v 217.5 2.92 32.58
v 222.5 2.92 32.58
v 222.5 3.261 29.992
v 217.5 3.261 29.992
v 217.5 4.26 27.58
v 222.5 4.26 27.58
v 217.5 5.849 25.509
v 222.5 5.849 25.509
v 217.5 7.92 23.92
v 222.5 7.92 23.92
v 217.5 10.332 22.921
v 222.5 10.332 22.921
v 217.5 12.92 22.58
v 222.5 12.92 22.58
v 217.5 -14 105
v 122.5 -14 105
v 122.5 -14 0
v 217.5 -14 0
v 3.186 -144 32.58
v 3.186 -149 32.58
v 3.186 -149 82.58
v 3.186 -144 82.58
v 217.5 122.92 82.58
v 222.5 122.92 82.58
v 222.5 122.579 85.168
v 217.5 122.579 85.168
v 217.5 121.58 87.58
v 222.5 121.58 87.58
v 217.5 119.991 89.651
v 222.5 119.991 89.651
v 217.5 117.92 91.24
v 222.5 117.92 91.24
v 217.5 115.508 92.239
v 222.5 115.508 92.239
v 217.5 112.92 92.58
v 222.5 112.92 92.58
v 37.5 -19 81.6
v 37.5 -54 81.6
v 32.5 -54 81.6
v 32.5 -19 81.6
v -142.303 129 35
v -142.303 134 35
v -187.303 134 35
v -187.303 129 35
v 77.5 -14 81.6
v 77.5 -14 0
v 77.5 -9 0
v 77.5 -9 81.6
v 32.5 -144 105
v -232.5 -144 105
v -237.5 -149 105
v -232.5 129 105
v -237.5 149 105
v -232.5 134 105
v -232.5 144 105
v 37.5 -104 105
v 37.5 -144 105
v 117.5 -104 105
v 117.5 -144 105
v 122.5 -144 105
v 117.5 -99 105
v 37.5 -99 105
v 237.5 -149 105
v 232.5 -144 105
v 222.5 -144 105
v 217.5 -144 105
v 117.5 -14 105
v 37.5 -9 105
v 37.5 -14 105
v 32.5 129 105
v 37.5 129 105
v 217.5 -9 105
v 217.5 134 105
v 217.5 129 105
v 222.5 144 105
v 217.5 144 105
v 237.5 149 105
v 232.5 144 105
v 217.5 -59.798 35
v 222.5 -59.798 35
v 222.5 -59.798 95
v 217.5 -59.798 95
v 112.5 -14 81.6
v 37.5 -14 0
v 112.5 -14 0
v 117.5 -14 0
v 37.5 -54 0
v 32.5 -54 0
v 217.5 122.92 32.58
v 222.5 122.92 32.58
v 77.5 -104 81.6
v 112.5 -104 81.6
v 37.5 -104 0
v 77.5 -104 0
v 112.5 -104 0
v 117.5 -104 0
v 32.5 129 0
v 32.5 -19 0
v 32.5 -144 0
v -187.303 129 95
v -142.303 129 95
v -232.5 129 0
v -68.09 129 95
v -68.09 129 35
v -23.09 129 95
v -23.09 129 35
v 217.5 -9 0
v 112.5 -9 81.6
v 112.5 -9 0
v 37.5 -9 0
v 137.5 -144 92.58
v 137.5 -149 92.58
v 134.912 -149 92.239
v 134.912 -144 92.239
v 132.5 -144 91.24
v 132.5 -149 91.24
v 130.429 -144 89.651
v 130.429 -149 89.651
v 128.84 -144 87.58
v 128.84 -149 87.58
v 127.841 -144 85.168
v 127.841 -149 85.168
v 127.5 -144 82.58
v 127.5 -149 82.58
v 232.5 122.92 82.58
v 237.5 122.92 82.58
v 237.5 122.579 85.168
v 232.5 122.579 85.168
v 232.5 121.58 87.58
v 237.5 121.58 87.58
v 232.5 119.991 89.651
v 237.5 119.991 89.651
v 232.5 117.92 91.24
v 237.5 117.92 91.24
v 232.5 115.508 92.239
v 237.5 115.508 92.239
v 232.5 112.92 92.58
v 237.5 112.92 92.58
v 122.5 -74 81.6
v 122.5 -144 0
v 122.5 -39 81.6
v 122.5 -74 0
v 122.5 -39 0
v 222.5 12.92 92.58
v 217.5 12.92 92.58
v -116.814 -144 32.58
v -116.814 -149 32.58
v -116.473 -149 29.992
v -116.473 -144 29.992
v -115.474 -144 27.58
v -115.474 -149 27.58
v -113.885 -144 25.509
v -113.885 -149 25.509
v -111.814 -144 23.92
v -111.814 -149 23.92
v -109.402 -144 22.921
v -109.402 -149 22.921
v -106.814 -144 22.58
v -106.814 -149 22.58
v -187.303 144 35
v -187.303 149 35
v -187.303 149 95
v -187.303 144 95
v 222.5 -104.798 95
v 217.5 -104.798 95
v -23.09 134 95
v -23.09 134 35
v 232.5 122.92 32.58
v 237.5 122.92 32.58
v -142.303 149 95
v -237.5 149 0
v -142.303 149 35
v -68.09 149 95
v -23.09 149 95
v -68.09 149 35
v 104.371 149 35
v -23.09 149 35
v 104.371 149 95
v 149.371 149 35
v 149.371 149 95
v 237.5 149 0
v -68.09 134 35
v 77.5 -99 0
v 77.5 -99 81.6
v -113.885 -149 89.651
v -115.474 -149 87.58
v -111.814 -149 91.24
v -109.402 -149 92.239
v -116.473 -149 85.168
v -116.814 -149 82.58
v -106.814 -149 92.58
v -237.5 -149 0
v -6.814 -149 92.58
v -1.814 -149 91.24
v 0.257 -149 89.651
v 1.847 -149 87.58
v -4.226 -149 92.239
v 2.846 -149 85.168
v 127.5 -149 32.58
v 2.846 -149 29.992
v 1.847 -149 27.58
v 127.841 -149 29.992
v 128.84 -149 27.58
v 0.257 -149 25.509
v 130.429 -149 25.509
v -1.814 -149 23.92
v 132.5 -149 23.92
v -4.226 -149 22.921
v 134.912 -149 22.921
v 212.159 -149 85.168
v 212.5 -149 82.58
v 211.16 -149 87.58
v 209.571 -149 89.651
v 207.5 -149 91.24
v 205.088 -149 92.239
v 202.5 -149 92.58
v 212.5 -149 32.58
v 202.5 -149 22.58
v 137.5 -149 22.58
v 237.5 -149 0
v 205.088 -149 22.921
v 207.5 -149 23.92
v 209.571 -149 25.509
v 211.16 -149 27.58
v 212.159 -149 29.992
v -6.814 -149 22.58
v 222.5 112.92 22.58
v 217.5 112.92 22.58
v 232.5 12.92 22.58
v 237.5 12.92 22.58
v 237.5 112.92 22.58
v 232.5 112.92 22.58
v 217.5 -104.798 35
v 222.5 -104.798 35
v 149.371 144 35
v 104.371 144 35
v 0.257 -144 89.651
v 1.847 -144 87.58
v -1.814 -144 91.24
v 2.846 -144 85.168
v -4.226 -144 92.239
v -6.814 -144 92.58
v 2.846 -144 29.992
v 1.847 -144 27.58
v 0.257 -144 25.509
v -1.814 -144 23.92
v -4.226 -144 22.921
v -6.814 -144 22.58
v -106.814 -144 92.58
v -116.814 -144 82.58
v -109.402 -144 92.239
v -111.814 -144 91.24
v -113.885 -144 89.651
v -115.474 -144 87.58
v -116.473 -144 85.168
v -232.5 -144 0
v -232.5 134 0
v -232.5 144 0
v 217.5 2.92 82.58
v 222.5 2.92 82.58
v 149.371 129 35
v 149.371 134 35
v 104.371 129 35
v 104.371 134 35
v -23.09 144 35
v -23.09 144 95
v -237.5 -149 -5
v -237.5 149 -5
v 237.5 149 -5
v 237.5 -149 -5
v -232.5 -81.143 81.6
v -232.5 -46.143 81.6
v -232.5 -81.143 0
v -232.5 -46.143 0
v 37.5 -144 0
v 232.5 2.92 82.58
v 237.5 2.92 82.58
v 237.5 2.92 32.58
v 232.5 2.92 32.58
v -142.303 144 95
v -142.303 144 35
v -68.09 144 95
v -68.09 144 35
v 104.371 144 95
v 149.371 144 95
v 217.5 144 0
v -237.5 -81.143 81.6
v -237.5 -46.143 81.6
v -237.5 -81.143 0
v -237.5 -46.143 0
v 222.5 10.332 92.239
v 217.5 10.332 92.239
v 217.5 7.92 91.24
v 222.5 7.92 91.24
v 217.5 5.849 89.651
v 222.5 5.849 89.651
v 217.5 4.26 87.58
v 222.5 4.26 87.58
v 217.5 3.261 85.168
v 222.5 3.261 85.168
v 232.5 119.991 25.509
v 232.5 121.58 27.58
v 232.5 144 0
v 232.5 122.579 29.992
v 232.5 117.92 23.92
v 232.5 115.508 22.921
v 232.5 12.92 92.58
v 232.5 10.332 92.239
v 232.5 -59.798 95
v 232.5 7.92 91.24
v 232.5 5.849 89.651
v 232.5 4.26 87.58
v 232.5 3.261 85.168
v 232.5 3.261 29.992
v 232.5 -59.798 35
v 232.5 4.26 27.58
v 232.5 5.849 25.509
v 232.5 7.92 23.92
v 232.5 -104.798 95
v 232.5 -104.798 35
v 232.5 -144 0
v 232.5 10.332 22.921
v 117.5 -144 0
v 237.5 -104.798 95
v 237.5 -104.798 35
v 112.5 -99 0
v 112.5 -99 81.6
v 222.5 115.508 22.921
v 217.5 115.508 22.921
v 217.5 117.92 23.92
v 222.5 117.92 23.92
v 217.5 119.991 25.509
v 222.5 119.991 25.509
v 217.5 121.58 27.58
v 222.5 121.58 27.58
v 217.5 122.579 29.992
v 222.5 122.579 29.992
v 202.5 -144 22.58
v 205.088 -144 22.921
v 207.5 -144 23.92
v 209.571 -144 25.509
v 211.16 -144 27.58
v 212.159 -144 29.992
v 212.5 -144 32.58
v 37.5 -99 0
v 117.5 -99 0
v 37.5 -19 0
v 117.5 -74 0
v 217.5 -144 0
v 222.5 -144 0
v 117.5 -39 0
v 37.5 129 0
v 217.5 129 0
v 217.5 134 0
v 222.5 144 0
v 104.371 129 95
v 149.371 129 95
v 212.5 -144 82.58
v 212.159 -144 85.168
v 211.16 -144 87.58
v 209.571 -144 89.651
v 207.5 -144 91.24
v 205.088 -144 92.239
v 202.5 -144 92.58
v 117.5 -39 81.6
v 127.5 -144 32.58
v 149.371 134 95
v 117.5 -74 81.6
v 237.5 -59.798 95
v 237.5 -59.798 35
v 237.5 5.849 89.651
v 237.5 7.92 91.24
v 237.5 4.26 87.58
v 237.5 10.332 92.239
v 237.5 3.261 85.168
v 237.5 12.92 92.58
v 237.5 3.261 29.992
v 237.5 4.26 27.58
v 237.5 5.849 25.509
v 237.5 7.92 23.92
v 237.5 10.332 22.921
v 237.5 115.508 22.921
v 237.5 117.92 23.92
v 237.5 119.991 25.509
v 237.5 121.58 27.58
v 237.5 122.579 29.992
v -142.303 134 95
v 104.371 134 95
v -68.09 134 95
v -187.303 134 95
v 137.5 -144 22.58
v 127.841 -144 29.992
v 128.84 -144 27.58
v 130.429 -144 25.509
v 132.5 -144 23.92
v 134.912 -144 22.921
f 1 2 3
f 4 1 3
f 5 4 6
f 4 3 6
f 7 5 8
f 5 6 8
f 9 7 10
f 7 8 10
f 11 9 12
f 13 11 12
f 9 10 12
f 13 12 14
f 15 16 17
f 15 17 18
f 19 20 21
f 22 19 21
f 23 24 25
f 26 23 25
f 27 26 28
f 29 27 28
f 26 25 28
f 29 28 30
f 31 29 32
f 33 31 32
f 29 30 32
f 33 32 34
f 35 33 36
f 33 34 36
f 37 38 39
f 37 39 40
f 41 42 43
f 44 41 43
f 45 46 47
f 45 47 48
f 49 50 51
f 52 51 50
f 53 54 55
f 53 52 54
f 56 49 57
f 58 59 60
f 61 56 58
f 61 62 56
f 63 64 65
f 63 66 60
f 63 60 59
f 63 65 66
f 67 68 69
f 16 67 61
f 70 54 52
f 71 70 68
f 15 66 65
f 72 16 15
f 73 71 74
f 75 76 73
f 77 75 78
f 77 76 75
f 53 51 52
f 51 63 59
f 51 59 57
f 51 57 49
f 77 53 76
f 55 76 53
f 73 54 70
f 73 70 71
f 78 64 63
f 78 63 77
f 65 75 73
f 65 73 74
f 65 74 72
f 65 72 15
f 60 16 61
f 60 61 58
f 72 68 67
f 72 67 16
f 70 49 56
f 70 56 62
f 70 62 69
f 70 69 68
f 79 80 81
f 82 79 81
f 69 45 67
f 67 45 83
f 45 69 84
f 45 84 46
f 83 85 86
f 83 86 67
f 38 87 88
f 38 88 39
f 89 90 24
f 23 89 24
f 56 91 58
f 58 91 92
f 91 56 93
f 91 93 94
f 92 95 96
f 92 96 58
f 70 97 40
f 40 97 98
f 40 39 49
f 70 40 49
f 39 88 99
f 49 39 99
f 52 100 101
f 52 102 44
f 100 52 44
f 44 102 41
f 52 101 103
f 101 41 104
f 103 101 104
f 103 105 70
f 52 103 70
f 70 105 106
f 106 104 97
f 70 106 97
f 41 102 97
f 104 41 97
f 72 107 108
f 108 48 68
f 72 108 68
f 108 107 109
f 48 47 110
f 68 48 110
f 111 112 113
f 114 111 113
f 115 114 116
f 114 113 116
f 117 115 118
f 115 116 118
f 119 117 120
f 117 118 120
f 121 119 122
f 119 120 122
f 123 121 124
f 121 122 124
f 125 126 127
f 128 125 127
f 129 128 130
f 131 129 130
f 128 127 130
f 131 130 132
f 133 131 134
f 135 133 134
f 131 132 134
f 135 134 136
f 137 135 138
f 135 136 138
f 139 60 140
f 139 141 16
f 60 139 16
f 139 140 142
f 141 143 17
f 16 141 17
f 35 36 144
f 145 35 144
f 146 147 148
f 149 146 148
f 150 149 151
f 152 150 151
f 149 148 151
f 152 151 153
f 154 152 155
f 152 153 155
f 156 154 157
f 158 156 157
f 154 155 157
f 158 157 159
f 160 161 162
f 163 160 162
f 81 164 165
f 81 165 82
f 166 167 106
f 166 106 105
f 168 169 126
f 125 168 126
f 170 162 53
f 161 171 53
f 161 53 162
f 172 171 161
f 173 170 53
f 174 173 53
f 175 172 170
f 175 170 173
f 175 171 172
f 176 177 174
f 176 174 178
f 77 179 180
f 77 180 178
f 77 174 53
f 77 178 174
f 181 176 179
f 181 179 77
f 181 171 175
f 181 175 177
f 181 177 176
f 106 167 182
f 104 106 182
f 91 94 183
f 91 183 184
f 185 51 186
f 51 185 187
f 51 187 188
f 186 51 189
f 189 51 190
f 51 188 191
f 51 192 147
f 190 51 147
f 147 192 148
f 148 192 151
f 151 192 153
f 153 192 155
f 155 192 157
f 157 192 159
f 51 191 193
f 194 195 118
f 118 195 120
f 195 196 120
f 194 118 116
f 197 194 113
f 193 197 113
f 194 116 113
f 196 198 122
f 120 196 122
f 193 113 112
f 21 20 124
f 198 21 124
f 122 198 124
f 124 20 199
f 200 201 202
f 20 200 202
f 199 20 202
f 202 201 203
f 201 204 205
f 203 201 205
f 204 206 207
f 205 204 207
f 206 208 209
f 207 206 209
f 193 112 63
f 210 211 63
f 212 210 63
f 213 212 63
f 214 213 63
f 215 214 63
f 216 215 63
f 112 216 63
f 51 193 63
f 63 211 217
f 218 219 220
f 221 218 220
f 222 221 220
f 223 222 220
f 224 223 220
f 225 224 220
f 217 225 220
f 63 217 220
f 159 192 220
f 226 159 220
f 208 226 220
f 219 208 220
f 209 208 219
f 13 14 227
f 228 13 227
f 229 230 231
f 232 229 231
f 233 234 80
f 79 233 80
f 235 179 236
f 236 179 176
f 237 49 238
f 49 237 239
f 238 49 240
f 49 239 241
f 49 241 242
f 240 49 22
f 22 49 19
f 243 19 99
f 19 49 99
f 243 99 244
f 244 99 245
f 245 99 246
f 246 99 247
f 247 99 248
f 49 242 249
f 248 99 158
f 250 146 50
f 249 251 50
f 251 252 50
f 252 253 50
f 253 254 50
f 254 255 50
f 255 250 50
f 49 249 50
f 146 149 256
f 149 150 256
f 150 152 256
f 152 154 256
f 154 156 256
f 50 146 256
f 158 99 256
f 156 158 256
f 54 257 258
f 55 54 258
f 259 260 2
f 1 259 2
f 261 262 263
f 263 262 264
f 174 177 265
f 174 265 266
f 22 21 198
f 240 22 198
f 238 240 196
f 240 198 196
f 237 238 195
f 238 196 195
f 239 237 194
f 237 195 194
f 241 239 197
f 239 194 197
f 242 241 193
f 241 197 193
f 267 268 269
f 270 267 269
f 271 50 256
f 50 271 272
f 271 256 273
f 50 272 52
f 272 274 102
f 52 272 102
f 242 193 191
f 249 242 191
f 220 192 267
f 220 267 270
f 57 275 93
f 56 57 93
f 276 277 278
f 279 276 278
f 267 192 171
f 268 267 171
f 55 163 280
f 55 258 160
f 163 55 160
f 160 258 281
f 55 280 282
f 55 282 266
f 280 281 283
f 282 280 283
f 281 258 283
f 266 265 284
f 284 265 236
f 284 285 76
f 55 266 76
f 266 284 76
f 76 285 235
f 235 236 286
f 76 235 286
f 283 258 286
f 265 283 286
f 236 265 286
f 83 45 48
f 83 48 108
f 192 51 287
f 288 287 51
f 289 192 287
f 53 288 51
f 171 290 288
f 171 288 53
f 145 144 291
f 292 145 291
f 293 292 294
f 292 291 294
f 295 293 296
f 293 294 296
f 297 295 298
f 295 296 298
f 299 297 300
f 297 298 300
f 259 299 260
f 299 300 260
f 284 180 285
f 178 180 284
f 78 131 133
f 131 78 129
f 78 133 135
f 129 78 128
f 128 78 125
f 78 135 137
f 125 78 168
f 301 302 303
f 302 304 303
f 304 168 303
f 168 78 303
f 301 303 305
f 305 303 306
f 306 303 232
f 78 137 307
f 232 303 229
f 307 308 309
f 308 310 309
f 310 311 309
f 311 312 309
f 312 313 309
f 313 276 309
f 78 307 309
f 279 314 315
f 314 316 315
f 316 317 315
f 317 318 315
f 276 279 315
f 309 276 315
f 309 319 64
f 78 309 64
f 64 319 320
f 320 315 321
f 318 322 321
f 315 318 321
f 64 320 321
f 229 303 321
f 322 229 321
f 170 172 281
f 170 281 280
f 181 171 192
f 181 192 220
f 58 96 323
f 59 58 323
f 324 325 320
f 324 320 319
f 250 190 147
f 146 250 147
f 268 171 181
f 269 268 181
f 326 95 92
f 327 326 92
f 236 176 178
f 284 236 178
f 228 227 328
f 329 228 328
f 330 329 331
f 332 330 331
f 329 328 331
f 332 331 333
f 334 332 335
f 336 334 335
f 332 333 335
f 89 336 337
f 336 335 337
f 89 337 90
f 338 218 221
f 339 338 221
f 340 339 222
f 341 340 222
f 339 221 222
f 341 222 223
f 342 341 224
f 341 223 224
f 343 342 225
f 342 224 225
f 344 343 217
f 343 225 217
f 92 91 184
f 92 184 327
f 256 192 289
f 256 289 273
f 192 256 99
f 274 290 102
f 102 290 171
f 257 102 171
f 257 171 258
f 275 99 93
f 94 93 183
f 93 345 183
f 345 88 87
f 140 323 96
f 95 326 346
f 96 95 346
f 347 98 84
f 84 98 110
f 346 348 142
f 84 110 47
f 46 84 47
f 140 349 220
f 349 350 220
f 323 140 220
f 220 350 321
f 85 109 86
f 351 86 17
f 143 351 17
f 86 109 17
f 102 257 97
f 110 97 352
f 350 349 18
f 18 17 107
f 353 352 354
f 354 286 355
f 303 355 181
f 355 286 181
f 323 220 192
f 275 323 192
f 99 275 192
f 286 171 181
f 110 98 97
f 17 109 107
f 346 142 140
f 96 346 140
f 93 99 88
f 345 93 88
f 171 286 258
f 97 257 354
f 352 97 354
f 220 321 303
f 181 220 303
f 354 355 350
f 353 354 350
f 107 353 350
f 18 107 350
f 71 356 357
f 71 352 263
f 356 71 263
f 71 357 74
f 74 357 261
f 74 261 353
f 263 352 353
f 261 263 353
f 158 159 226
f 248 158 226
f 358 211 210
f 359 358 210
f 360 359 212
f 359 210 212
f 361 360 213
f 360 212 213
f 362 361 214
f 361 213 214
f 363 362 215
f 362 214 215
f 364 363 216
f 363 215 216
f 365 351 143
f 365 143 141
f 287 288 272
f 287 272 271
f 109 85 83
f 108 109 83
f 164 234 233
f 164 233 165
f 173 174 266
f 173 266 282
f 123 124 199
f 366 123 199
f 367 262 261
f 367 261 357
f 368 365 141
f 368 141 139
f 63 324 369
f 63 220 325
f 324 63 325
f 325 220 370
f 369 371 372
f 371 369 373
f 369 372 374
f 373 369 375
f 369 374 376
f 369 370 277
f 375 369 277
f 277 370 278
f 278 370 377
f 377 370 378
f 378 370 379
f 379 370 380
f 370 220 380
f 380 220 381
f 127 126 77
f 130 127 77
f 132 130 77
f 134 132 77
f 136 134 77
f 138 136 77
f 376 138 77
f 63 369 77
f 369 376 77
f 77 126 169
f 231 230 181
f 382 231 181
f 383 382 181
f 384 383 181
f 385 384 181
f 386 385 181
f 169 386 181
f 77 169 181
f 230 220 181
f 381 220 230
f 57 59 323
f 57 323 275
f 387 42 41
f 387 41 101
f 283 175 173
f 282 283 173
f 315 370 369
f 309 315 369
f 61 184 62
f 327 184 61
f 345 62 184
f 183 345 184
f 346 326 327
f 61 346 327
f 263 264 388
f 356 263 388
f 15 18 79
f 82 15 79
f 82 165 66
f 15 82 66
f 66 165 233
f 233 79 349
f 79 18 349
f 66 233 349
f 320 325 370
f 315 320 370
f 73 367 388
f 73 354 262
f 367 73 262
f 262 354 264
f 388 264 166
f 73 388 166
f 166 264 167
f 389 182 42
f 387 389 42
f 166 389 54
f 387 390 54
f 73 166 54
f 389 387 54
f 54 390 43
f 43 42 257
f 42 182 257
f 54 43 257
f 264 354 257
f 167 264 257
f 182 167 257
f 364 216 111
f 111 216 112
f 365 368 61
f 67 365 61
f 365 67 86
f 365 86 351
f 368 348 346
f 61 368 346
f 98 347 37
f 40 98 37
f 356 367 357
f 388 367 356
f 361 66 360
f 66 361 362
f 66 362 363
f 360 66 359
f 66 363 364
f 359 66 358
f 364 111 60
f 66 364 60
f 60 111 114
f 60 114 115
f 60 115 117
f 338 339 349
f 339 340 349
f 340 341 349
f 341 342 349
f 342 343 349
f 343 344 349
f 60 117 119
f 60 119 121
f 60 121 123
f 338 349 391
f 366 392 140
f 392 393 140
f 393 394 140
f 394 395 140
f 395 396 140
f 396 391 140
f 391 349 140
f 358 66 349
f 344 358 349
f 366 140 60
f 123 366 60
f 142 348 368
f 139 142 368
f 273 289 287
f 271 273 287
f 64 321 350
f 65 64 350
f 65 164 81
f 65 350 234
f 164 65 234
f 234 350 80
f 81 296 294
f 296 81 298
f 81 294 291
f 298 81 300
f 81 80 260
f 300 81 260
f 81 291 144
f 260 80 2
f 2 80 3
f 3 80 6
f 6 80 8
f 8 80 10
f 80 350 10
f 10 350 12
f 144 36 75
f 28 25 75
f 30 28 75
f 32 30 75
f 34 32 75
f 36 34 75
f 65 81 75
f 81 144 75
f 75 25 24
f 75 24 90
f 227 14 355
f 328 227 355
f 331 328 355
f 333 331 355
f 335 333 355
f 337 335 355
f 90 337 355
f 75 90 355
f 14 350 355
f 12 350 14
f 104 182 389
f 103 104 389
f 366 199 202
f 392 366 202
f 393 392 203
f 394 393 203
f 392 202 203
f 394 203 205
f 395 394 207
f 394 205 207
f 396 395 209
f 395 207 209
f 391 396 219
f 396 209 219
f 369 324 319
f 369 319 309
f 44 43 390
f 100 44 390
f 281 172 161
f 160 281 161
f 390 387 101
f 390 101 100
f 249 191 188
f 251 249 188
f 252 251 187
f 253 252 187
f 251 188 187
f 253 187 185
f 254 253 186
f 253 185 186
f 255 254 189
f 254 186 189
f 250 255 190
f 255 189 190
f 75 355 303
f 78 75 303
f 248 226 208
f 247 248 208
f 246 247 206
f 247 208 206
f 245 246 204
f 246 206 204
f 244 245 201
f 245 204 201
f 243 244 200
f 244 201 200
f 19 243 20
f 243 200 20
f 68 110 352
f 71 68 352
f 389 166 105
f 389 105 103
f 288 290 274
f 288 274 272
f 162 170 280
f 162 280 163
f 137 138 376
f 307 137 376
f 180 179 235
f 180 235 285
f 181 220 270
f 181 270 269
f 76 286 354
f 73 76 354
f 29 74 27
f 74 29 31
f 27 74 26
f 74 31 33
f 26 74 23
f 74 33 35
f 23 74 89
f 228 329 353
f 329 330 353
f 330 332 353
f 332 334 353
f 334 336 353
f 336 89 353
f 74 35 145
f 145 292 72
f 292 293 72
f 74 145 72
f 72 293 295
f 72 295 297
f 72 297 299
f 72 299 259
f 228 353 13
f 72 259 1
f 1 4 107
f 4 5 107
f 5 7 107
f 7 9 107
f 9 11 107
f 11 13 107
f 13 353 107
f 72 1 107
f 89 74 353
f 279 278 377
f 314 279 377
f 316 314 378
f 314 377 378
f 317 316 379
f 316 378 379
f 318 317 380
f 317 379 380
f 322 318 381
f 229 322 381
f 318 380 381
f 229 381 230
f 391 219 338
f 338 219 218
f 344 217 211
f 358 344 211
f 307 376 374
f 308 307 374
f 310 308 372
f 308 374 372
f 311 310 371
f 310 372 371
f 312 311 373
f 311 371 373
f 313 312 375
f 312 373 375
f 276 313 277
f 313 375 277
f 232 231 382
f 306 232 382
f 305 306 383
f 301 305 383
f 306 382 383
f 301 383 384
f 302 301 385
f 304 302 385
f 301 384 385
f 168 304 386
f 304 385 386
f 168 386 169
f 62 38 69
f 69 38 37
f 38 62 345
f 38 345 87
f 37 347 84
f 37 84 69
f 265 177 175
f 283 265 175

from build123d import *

# Parameters (mm, degrees)
F0_W      = 475
F0_H      = 298
F1_DEPTH  = 5
F2_W      = 475
F2_H      = 298
F2_W_2    = 80
F2_H_2    = 5
F3_DEPTH  = 105
F4_W      = 45
F4_H      = 60
F5_DEPTH  = 20
F7_DEPTH  = 5
F8_W      = 45
F8_H      = 60
F9_DEPTH  = 20
F10_W     = 35
F10_H     = 81.6
F11_DEPTH = 5
F12_W     = 35
F12_H     = 81.6
F13_DEPTH = 5
F14_W     = 35
F14_H     = 81.6
F15_DEPTH = 5
F16_W     = 35
F16_H     = 81.6
F17_DEPTH = 5
F18_W     = 35
F18_H     = 81.6
F19_DEPTH = 5


# Not quite as in the source:
# - a feature names something its author has since deleted; it is built from what else it names


with BuildPart() as f1:
    # F0 (on Top) → F1 (new body)
    with BuildSketch(Plane.XY):
        Rectangle(F0_W, F0_H)
    extrude(amount=-F1_DEPTH)


with BuildPart() as f3:
    # F2 (on face) → F3 (new body)
    with BuildSketch(Plane.XY):
        Rectangle(F2_W, F2_H)
        Polygon((232.5, 144), (232.5, -144), (222.5, -144), (217.5, -144), (122.5, -144), (117.5, -144), (37.5, -144), (32.5, -144), (-232.5, -144), (-232.5, 129), (-232.5, 134), (-232.5, 144), (217.5, 144), (222.5, 144), align=None, mode=Mode.SUBTRACT)
        Polygon((217.5, 129), (217.5, 134), (-232.5, 134), (-232.5, 129), (32.5, 129), (37.5, 129), align=None)
        Polygon((32.5, -144), (37.5, -144), (37.5, -104), (37.5, -99), (37.5, -14), (37.5, -9), (37.5, 129), (32.5, 129), align=None)
        Polygon((217.5, -144), (222.5, -144), (222.5, 144), (217.5, 144), (217.5, 134), (217.5, 129), (217.5, -9), (217.5, -14), align=None)
        Polygon((117.5, -144), (122.5, -144), (122.5, -14), (117.5, -14), (117.5, -99), (117.5, -104), align=None)
        Polygon((122.5, -14), (217.5, -14), (217.5, -9), (37.5, -9), (37.5, -14), (117.5, -14), align=None)
        with Locations((77.5, -101.5)):
            Rectangle(F2_W_2, F2_H_2)
    extrude(amount=F3_DEPTH)

    # F4 (on face) → F5 (cut, through all)
    with BuildSketch(Plane(origin=(0, 149, 0), x_dir=(-1, 0, 0), z_dir=(0, 1, 0))):
        with Locations((164.8025205731, 65)):
            Rectangle(F4_W, F4_H)
        with Locations((-126.8706479669, 65)):
            Rectangle(F4_W, F4_H)
        with Locations((45.589773953, 65)):
            Rectangle(F4_W, F4_H)
    extrude(amount=-F5_DEPTH, mode=Mode.SUBTRACT)

    # F6 (on face) → F7 (cut, through all)
    with BuildSketch(Plane.XZ.offset(149)):
        with BuildLine():
            ThreePointArc((3.1862647831, 82.5802037477), (0.257332595, 89.6512715596), (-6.8137352169, 92.5802037477))
            Line((-6.8137352169, 92.5802037477), (-106.8137352169, 92.5802037477))
            ThreePointArc((-106.8137352169, 92.5802037477), (-113.8848030287, 89.6512715596), (-116.8137352169, 82.5802037477))
            Line((-116.8137352169, 82.5802037477), (-116.8137352169, 32.5802037477))
            ThreePointArc((-116.8137352169, 32.5802037477), (-113.8848030287, 25.5091359359), (-106.8137352169, 22.5802037477))
            Line((-106.8137352169, 22.5802037477), (-6.8137352169, 22.5802037477))
            ThreePointArc((-6.8137352169, 22.5802037477), (0.257332595, 25.5091359359), (3.1862647831, 32.5802037477))
            Line((3.1862647831, 32.5802037477), (3.1862647831, 82.5802037477))
        make_face()
        with BuildLine():
            Line((202.5, 92.5802037477), (137.5, 92.5802037477))
            ThreePointArc((137.5, 92.5802037477), (130.4289321881, 89.6512715596), (127.5, 82.5802037477))
            Line((127.5, 82.5802037477), (127.5, 32.5802037477))
            ThreePointArc((127.5, 32.5802037477), (130.4289321881, 25.5091359359), (137.5, 22.5802037477))
            Line((137.5, 22.5802037477), (202.5, 22.5802037477))
            ThreePointArc((202.5, 22.5802037477), (209.5710678119, 25.5091359359), (212.5, 32.5802037477))
            Line((212.5, 32.5802037477), (212.5, 82.5802037477))
            ThreePointArc((212.5, 82.5802037477), (209.5710678119, 89.6512715596), (202.5, 92.5802037477))
        make_face()
    extrude(amount=-F7_DEPTH, mode=Mode.SUBTRACT)

    # F8 (on face) → F9 (cut, through all)
    with BuildSketch(Plane.YZ.offset(237.5)):
        with Locations((-82.2980084391, 65)):
            Rectangle(F8_W, F8_H)
        with BuildLine():
            Line((112.9197687081, 92.5802037477), (12.9197687081, 92.5802037477))
            ThreePointArc((12.9197687081, 92.5802037477), (5.8487008962, 89.6512715596), (2.9197687081, 82.5802037477))
            Line((2.9197687081, 82.5802037477), (2.9197687081, 32.5802037477))
            ThreePointArc((2.9197687081, 32.5802037477), (5.8487008962, 25.5091359359), (12.9197687081, 22.5802037477))
            Line((12.9197687081, 22.5802037477), (112.9197687081, 22.5802037477))
            ThreePointArc((112.9197687081, 22.5802037477), (119.9908365199, 25.5091359359), (122.9197687081, 32.5802037477))
            Line((122.9197687081, 32.5802037477), (122.9197687081, 82.5802037477))
            ThreePointArc((122.9197687081, 82.5802037477), (119.9908365199, 89.6512715596), (112.9197687081, 92.5802037477))
        make_face()
    extrude(amount=-F9_DEPTH, mode=Mode.SUBTRACT)

    # F10 (on face) → F11 (cut, through all)
    with BuildSketch(Plane.YZ.offset(37.5)):
        with Locations((-36.5, 40.8)):
            Rectangle(F10_W, F10_H)
    extrude(amount=-F11_DEPTH, mode=Mode.SUBTRACT)

    # F12 (on face) → F13 (cut, through all)
    with BuildSketch(Plane(origin=(117.5, 0, 0), x_dir=(0, -1, 0), z_dir=(-1, 0, 0))):
        with Locations((56.5, 40.8)):
            Rectangle(F12_W, F12_H)
    extrude(amount=-F13_DEPTH, mode=Mode.SUBTRACT)

    # F14 (on face) → F15 (cut, through all)
    with BuildSketch(Plane.XZ.offset(104)):
        with Locations((95, 40.8)):
            Rectangle(F14_W, F14_H)
    extrude(amount=-F15_DEPTH, mode=Mode.SUBTRACT)

    # F16 (on face) → F17 (cut, through all)
    with BuildSketch(Plane.XZ.offset(14)):
        with Locations((95, 40.8)):
            Rectangle(F16_W, F16_H)
    extrude(amount=-F17_DEPTH, mode=Mode.SUBTRACT)

    # F18 (on face) → F19 (cut, through all)
    with BuildSketch(Plane(origin=(-237.5, 0, 0), x_dir=(0, -1, 0), z_dir=(-1, 0, 0))):
        with Locations((63.6425632238, 40.8)):
            Rectangle(F18_W, F18_H)
    extrude(amount=-F19_DEPTH, mode=Mode.SUBTRACT)


solid = Compound([f1.part, f3.part])
